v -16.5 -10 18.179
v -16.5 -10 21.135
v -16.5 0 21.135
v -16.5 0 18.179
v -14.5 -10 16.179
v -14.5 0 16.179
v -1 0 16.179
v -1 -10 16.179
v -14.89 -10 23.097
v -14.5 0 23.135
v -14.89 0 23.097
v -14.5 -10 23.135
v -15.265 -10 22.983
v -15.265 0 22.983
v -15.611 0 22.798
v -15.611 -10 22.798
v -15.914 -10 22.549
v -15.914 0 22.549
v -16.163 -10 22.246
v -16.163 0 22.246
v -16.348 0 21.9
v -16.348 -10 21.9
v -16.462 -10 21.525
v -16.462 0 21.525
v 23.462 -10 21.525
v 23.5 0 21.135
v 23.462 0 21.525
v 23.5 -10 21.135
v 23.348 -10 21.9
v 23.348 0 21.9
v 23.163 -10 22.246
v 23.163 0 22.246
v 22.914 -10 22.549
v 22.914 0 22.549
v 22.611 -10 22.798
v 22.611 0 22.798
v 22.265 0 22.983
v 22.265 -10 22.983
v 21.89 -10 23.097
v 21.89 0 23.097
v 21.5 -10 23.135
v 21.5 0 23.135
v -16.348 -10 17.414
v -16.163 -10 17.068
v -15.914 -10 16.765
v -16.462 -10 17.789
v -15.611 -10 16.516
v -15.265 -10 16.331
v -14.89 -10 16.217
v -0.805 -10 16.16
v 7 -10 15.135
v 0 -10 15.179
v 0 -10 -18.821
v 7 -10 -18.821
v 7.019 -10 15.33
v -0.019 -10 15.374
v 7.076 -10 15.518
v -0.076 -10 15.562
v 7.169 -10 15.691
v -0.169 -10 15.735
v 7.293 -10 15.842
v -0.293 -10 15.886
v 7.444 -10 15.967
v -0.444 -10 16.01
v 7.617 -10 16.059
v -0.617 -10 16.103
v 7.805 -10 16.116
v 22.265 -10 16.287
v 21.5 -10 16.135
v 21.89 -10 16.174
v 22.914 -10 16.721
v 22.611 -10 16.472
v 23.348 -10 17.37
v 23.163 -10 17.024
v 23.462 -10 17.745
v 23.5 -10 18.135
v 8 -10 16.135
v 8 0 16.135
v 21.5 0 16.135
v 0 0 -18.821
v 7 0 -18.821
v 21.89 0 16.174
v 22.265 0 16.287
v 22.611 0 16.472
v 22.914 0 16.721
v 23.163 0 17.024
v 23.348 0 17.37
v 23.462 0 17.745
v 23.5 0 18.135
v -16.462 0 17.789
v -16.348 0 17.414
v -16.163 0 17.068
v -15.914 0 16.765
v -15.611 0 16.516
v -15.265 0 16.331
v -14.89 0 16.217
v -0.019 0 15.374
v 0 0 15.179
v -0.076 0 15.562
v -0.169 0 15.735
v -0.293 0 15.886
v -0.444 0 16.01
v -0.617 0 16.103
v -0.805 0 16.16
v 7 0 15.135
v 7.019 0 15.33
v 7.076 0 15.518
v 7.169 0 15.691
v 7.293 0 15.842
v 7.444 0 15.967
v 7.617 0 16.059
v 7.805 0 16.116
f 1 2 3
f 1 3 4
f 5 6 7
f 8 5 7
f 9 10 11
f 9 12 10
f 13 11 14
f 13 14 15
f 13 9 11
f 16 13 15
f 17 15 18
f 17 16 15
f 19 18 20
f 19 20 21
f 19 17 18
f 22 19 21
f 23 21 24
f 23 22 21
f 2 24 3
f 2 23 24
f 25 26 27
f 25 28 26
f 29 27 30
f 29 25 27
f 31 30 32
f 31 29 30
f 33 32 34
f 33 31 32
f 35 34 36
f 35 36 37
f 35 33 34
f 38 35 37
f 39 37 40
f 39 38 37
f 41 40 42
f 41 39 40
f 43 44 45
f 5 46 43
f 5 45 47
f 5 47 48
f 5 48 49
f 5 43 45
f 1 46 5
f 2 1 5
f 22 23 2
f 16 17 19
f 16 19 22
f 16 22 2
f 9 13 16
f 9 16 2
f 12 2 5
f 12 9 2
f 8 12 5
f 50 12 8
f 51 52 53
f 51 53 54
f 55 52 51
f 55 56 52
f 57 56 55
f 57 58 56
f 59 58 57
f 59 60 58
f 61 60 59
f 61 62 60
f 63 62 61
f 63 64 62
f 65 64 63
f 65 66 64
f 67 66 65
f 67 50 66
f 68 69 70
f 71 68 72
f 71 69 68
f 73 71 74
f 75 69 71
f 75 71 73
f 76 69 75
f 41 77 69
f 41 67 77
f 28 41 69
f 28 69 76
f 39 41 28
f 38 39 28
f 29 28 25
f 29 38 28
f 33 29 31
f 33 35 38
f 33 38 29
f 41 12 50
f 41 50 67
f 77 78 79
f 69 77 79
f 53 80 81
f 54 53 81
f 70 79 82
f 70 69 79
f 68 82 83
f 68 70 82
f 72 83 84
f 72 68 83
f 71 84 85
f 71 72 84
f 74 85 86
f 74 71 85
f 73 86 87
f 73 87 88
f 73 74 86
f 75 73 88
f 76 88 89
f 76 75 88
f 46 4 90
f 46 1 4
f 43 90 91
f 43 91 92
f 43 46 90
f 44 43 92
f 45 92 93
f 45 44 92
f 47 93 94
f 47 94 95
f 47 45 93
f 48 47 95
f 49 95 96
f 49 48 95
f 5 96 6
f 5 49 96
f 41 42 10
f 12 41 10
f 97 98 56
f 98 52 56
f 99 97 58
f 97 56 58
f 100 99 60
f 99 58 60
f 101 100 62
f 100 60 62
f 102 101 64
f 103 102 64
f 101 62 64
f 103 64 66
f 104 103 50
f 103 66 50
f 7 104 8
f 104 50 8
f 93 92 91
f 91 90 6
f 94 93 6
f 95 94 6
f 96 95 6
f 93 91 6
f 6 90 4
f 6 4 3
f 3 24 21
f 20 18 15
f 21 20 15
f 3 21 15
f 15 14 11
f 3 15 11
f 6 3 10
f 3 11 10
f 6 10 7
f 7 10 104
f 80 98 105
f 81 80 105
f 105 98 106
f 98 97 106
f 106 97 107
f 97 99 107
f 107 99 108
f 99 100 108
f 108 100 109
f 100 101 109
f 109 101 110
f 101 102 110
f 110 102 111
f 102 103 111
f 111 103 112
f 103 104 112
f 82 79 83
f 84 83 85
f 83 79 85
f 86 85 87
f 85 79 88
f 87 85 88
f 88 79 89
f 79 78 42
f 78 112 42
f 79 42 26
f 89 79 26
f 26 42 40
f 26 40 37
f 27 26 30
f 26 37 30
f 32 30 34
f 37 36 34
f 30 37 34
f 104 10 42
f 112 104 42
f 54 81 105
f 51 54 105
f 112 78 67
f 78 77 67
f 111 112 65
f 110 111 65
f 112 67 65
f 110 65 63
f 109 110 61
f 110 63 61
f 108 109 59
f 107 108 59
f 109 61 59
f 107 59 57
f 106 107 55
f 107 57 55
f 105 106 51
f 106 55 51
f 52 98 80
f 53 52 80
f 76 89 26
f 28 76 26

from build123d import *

# Parameters (mm, degrees)
F1_DEPTH = 10
F2_R     = 2
F3_R     = 1


with BuildPart() as f1:
    # F0 (on Front) → F1 (new body)
    with BuildSketch(Plane.XZ):
        Polygon((0, 16.178953), (0, -18.821047), (7, -18.821047), (7, 16.135083), (23.5, 16.135083), (23.5, 23.135083), (-16.5, 23.135083), (-16.5, 16.178953), (-5, 16.178953), align=None)
    extrude(amount=F1_DEPTH)

    # F2
    f2_edges = [f1.edges().sort_by_distance(p)[0] for p in [
        (-16.5, -5, 23.135083),
        (23.5, -5, 23.135083),
        (-16.5, -5, 16.178953),
        (23.5, -5, 16.135083),
    ]]
    fillet(f2_edges, radius=F2_R)

    # F3
    f3_edges = [f1.edges().sort_by_distance(p)[0] for p in [
        (0, -5, 16.178953),
        (7, -5, 16.135083),
    ]]
    fillet(f3_edges, radius=F3_R)


solid = f1.part
